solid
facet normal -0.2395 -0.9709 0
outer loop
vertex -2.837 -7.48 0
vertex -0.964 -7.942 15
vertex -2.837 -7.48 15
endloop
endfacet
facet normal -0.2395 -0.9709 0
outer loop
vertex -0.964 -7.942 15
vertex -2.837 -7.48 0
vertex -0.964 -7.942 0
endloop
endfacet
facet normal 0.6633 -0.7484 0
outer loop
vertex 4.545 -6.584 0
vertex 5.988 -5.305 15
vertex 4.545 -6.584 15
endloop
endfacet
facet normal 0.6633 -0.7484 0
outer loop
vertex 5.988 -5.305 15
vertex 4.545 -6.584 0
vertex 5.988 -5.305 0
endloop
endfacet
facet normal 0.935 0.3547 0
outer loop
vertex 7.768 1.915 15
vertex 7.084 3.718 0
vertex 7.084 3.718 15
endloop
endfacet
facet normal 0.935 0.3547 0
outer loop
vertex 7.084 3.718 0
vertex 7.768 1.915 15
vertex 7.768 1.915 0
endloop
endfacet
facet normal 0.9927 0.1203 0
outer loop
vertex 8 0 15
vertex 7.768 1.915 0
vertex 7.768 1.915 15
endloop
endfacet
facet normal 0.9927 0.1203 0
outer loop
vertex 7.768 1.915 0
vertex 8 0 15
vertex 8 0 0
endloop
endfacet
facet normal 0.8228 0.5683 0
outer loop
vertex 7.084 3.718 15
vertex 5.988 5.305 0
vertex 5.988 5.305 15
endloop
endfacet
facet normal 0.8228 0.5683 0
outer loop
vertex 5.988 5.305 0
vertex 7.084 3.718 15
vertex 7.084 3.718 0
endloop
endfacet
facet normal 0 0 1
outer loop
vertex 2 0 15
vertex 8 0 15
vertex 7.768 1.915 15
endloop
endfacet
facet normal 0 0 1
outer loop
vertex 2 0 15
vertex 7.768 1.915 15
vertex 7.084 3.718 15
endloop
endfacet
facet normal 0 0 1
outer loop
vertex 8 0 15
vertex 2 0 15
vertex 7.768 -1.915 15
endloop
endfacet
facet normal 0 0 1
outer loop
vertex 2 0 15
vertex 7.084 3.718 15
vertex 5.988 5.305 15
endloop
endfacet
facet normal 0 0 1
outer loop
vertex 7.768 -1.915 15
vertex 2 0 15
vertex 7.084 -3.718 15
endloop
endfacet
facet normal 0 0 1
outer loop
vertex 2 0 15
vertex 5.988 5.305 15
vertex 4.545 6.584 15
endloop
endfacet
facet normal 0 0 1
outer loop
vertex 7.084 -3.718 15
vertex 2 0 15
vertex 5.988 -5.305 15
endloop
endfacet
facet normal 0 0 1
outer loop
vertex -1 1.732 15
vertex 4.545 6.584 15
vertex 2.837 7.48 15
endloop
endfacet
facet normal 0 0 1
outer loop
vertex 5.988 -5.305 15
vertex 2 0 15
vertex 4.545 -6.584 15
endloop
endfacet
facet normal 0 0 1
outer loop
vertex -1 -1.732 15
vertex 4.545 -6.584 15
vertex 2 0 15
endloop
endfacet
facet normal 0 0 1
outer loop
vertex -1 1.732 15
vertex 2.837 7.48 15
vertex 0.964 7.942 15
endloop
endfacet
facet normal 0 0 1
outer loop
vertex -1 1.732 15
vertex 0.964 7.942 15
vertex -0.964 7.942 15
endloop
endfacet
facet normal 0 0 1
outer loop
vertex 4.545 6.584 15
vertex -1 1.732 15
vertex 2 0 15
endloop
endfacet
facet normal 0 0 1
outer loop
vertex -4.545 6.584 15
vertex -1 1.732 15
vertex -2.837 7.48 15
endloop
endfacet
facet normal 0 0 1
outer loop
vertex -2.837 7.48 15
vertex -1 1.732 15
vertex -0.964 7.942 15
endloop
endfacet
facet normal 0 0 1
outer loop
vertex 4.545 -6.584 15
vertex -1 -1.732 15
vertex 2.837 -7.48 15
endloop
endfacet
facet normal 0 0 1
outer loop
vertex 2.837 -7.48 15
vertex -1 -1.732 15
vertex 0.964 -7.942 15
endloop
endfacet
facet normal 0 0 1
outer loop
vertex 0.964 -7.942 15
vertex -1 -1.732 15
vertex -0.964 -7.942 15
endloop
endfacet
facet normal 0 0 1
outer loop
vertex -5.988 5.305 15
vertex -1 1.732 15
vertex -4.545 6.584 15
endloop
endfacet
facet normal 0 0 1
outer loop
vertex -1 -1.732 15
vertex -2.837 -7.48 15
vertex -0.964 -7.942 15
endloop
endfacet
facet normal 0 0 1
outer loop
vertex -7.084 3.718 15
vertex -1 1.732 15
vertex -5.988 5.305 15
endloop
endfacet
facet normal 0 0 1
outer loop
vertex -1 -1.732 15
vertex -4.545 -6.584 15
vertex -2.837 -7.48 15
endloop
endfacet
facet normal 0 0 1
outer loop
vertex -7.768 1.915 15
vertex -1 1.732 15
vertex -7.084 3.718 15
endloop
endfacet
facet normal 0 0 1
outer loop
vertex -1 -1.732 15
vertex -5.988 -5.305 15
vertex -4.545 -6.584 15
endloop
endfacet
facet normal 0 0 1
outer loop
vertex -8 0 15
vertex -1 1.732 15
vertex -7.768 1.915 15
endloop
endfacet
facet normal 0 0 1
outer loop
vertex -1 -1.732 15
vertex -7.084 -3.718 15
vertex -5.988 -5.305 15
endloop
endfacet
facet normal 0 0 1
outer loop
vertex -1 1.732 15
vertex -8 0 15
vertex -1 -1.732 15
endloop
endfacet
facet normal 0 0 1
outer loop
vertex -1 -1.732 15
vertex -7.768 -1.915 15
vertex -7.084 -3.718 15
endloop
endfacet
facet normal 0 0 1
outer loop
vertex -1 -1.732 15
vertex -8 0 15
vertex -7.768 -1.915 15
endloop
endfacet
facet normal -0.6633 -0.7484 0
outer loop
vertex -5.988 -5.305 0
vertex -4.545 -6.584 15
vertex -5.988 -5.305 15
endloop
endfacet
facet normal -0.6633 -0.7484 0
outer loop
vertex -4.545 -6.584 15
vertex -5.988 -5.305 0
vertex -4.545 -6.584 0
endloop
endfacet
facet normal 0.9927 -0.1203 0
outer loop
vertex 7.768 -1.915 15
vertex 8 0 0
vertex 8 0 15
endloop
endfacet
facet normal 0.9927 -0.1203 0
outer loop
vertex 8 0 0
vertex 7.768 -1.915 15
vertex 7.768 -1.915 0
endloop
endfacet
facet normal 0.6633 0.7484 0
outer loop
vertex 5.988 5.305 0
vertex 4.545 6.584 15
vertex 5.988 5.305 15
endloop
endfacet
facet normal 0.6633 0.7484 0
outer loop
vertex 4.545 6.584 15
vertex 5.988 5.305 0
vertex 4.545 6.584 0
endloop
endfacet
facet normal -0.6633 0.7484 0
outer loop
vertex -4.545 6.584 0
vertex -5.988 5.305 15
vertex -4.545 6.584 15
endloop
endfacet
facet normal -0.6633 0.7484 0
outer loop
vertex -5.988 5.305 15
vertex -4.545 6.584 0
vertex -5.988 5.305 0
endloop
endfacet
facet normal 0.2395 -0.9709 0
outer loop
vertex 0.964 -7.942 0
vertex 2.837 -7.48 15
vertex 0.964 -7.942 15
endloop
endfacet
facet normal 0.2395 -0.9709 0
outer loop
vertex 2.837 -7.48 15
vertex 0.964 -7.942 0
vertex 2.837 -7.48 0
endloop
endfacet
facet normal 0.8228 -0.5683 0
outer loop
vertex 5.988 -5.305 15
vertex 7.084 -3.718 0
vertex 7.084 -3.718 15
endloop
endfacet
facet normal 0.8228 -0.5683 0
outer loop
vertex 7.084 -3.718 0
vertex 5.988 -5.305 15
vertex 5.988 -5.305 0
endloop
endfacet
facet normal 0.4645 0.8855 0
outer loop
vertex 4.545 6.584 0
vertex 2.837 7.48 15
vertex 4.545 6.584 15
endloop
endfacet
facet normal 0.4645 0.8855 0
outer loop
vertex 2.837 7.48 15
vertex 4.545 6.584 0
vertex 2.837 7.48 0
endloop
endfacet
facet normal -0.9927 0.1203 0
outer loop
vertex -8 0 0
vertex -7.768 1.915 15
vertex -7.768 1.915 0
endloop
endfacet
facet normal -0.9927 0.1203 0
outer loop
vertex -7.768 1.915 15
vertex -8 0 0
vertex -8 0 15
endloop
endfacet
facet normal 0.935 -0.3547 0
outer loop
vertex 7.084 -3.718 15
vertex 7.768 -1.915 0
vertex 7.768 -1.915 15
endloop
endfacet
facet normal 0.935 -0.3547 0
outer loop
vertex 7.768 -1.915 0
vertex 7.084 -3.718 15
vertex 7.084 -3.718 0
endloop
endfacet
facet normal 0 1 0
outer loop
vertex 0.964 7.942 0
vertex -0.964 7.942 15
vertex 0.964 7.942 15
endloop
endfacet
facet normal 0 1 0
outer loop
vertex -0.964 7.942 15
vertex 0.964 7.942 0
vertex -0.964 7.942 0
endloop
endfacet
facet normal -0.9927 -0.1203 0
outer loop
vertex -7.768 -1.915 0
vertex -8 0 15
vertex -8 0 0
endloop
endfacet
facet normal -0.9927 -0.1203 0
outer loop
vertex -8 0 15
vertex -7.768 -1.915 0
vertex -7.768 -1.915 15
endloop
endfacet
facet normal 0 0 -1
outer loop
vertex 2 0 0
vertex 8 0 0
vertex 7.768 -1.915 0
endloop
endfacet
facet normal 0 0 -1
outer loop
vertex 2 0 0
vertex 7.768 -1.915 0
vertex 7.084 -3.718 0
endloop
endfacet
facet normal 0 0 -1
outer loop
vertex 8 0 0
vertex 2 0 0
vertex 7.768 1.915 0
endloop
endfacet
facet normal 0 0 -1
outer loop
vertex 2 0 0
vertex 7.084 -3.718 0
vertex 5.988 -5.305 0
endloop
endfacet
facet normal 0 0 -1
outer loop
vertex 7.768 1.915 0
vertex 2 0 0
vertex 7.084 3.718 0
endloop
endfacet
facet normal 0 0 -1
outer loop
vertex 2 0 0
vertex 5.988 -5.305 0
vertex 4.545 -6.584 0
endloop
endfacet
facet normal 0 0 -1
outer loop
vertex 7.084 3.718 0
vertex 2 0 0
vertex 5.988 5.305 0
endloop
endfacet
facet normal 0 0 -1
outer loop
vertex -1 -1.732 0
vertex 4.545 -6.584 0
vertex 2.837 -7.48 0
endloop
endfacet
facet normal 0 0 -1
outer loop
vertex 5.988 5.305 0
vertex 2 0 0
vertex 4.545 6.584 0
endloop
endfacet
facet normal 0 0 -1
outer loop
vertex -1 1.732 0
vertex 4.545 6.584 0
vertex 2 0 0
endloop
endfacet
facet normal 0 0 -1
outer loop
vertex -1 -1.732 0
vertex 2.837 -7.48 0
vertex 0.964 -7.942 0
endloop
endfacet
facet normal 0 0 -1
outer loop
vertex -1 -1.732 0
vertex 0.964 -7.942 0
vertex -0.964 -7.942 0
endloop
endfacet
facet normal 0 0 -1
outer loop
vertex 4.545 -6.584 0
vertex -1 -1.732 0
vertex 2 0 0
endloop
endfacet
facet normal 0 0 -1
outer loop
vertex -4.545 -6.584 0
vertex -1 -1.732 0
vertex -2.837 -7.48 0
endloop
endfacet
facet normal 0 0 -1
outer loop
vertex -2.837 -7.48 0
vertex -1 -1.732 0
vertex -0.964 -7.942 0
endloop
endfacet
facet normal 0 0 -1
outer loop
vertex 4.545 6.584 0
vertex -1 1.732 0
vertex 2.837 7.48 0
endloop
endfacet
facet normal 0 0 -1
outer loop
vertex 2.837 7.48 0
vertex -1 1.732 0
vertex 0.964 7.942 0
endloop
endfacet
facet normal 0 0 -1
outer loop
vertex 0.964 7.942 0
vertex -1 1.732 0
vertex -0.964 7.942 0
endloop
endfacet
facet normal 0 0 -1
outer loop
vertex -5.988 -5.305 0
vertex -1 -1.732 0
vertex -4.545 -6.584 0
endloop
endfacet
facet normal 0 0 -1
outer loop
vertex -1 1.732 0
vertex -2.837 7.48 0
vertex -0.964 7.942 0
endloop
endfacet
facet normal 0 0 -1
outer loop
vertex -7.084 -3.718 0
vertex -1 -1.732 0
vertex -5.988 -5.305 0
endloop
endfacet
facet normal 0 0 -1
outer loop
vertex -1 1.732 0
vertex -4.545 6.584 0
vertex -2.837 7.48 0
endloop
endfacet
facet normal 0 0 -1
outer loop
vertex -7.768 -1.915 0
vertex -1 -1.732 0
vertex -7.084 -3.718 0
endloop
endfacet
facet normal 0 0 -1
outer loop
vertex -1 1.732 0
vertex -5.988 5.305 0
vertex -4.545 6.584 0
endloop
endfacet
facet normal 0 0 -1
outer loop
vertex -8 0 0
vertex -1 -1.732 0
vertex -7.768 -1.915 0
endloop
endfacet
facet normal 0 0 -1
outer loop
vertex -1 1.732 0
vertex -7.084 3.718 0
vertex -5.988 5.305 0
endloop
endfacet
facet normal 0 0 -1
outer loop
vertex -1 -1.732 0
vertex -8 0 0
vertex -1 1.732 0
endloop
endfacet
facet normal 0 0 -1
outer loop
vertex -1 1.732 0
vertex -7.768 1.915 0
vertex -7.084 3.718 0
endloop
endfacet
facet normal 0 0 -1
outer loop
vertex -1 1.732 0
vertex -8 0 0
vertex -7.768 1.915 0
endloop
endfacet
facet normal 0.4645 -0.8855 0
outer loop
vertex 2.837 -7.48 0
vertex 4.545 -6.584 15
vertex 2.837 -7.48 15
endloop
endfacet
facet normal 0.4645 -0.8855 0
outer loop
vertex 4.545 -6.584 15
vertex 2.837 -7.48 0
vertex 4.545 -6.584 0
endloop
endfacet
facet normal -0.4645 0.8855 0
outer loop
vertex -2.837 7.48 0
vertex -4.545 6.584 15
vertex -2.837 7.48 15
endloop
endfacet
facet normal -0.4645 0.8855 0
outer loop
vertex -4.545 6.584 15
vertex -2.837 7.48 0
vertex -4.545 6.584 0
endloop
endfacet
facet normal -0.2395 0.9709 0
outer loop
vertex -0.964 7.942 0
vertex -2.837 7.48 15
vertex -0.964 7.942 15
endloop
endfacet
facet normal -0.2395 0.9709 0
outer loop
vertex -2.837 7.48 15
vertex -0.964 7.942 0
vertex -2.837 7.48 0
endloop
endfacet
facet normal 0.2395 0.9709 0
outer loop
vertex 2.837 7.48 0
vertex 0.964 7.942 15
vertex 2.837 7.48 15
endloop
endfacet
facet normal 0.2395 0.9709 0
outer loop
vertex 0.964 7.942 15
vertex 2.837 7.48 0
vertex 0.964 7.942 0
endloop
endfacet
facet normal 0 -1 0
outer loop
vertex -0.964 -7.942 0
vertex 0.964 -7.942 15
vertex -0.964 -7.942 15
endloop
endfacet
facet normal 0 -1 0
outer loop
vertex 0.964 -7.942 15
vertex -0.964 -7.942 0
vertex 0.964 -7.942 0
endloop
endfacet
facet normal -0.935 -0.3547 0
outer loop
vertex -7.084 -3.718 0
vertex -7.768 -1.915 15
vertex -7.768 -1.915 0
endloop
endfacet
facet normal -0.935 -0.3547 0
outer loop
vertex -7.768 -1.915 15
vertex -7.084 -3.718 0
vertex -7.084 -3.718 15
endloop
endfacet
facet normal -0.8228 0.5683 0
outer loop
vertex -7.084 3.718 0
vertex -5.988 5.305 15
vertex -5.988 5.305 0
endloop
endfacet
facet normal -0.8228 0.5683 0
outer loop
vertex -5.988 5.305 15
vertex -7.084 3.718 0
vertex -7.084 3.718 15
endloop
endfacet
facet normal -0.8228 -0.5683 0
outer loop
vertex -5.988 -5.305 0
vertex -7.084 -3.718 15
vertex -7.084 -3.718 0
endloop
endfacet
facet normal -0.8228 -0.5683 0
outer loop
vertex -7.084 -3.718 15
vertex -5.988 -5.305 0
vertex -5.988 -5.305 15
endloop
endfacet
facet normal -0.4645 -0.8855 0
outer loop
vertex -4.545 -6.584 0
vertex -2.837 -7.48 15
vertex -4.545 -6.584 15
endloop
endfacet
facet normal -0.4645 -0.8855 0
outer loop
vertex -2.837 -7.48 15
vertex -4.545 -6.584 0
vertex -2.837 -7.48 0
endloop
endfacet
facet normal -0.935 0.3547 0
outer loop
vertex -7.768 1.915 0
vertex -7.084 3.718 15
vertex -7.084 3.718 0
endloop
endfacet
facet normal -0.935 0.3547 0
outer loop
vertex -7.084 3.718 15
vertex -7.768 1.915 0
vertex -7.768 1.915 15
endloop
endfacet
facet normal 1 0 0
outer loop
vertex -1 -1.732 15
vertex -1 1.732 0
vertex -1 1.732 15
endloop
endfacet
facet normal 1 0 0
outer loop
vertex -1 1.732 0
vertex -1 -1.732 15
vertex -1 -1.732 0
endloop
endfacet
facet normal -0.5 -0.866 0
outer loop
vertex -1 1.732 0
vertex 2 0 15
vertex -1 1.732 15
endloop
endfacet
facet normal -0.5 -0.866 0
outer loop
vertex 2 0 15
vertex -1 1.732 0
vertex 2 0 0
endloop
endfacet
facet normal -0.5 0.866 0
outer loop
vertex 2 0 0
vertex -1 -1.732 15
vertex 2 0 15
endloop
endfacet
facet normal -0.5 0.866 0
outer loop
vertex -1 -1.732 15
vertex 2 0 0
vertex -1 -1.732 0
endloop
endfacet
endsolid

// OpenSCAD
difference() {
    cylinder(r=8,h=15);
    cylinder(r=2,h=15,$fn=3); //Seitenlänge 6
}
